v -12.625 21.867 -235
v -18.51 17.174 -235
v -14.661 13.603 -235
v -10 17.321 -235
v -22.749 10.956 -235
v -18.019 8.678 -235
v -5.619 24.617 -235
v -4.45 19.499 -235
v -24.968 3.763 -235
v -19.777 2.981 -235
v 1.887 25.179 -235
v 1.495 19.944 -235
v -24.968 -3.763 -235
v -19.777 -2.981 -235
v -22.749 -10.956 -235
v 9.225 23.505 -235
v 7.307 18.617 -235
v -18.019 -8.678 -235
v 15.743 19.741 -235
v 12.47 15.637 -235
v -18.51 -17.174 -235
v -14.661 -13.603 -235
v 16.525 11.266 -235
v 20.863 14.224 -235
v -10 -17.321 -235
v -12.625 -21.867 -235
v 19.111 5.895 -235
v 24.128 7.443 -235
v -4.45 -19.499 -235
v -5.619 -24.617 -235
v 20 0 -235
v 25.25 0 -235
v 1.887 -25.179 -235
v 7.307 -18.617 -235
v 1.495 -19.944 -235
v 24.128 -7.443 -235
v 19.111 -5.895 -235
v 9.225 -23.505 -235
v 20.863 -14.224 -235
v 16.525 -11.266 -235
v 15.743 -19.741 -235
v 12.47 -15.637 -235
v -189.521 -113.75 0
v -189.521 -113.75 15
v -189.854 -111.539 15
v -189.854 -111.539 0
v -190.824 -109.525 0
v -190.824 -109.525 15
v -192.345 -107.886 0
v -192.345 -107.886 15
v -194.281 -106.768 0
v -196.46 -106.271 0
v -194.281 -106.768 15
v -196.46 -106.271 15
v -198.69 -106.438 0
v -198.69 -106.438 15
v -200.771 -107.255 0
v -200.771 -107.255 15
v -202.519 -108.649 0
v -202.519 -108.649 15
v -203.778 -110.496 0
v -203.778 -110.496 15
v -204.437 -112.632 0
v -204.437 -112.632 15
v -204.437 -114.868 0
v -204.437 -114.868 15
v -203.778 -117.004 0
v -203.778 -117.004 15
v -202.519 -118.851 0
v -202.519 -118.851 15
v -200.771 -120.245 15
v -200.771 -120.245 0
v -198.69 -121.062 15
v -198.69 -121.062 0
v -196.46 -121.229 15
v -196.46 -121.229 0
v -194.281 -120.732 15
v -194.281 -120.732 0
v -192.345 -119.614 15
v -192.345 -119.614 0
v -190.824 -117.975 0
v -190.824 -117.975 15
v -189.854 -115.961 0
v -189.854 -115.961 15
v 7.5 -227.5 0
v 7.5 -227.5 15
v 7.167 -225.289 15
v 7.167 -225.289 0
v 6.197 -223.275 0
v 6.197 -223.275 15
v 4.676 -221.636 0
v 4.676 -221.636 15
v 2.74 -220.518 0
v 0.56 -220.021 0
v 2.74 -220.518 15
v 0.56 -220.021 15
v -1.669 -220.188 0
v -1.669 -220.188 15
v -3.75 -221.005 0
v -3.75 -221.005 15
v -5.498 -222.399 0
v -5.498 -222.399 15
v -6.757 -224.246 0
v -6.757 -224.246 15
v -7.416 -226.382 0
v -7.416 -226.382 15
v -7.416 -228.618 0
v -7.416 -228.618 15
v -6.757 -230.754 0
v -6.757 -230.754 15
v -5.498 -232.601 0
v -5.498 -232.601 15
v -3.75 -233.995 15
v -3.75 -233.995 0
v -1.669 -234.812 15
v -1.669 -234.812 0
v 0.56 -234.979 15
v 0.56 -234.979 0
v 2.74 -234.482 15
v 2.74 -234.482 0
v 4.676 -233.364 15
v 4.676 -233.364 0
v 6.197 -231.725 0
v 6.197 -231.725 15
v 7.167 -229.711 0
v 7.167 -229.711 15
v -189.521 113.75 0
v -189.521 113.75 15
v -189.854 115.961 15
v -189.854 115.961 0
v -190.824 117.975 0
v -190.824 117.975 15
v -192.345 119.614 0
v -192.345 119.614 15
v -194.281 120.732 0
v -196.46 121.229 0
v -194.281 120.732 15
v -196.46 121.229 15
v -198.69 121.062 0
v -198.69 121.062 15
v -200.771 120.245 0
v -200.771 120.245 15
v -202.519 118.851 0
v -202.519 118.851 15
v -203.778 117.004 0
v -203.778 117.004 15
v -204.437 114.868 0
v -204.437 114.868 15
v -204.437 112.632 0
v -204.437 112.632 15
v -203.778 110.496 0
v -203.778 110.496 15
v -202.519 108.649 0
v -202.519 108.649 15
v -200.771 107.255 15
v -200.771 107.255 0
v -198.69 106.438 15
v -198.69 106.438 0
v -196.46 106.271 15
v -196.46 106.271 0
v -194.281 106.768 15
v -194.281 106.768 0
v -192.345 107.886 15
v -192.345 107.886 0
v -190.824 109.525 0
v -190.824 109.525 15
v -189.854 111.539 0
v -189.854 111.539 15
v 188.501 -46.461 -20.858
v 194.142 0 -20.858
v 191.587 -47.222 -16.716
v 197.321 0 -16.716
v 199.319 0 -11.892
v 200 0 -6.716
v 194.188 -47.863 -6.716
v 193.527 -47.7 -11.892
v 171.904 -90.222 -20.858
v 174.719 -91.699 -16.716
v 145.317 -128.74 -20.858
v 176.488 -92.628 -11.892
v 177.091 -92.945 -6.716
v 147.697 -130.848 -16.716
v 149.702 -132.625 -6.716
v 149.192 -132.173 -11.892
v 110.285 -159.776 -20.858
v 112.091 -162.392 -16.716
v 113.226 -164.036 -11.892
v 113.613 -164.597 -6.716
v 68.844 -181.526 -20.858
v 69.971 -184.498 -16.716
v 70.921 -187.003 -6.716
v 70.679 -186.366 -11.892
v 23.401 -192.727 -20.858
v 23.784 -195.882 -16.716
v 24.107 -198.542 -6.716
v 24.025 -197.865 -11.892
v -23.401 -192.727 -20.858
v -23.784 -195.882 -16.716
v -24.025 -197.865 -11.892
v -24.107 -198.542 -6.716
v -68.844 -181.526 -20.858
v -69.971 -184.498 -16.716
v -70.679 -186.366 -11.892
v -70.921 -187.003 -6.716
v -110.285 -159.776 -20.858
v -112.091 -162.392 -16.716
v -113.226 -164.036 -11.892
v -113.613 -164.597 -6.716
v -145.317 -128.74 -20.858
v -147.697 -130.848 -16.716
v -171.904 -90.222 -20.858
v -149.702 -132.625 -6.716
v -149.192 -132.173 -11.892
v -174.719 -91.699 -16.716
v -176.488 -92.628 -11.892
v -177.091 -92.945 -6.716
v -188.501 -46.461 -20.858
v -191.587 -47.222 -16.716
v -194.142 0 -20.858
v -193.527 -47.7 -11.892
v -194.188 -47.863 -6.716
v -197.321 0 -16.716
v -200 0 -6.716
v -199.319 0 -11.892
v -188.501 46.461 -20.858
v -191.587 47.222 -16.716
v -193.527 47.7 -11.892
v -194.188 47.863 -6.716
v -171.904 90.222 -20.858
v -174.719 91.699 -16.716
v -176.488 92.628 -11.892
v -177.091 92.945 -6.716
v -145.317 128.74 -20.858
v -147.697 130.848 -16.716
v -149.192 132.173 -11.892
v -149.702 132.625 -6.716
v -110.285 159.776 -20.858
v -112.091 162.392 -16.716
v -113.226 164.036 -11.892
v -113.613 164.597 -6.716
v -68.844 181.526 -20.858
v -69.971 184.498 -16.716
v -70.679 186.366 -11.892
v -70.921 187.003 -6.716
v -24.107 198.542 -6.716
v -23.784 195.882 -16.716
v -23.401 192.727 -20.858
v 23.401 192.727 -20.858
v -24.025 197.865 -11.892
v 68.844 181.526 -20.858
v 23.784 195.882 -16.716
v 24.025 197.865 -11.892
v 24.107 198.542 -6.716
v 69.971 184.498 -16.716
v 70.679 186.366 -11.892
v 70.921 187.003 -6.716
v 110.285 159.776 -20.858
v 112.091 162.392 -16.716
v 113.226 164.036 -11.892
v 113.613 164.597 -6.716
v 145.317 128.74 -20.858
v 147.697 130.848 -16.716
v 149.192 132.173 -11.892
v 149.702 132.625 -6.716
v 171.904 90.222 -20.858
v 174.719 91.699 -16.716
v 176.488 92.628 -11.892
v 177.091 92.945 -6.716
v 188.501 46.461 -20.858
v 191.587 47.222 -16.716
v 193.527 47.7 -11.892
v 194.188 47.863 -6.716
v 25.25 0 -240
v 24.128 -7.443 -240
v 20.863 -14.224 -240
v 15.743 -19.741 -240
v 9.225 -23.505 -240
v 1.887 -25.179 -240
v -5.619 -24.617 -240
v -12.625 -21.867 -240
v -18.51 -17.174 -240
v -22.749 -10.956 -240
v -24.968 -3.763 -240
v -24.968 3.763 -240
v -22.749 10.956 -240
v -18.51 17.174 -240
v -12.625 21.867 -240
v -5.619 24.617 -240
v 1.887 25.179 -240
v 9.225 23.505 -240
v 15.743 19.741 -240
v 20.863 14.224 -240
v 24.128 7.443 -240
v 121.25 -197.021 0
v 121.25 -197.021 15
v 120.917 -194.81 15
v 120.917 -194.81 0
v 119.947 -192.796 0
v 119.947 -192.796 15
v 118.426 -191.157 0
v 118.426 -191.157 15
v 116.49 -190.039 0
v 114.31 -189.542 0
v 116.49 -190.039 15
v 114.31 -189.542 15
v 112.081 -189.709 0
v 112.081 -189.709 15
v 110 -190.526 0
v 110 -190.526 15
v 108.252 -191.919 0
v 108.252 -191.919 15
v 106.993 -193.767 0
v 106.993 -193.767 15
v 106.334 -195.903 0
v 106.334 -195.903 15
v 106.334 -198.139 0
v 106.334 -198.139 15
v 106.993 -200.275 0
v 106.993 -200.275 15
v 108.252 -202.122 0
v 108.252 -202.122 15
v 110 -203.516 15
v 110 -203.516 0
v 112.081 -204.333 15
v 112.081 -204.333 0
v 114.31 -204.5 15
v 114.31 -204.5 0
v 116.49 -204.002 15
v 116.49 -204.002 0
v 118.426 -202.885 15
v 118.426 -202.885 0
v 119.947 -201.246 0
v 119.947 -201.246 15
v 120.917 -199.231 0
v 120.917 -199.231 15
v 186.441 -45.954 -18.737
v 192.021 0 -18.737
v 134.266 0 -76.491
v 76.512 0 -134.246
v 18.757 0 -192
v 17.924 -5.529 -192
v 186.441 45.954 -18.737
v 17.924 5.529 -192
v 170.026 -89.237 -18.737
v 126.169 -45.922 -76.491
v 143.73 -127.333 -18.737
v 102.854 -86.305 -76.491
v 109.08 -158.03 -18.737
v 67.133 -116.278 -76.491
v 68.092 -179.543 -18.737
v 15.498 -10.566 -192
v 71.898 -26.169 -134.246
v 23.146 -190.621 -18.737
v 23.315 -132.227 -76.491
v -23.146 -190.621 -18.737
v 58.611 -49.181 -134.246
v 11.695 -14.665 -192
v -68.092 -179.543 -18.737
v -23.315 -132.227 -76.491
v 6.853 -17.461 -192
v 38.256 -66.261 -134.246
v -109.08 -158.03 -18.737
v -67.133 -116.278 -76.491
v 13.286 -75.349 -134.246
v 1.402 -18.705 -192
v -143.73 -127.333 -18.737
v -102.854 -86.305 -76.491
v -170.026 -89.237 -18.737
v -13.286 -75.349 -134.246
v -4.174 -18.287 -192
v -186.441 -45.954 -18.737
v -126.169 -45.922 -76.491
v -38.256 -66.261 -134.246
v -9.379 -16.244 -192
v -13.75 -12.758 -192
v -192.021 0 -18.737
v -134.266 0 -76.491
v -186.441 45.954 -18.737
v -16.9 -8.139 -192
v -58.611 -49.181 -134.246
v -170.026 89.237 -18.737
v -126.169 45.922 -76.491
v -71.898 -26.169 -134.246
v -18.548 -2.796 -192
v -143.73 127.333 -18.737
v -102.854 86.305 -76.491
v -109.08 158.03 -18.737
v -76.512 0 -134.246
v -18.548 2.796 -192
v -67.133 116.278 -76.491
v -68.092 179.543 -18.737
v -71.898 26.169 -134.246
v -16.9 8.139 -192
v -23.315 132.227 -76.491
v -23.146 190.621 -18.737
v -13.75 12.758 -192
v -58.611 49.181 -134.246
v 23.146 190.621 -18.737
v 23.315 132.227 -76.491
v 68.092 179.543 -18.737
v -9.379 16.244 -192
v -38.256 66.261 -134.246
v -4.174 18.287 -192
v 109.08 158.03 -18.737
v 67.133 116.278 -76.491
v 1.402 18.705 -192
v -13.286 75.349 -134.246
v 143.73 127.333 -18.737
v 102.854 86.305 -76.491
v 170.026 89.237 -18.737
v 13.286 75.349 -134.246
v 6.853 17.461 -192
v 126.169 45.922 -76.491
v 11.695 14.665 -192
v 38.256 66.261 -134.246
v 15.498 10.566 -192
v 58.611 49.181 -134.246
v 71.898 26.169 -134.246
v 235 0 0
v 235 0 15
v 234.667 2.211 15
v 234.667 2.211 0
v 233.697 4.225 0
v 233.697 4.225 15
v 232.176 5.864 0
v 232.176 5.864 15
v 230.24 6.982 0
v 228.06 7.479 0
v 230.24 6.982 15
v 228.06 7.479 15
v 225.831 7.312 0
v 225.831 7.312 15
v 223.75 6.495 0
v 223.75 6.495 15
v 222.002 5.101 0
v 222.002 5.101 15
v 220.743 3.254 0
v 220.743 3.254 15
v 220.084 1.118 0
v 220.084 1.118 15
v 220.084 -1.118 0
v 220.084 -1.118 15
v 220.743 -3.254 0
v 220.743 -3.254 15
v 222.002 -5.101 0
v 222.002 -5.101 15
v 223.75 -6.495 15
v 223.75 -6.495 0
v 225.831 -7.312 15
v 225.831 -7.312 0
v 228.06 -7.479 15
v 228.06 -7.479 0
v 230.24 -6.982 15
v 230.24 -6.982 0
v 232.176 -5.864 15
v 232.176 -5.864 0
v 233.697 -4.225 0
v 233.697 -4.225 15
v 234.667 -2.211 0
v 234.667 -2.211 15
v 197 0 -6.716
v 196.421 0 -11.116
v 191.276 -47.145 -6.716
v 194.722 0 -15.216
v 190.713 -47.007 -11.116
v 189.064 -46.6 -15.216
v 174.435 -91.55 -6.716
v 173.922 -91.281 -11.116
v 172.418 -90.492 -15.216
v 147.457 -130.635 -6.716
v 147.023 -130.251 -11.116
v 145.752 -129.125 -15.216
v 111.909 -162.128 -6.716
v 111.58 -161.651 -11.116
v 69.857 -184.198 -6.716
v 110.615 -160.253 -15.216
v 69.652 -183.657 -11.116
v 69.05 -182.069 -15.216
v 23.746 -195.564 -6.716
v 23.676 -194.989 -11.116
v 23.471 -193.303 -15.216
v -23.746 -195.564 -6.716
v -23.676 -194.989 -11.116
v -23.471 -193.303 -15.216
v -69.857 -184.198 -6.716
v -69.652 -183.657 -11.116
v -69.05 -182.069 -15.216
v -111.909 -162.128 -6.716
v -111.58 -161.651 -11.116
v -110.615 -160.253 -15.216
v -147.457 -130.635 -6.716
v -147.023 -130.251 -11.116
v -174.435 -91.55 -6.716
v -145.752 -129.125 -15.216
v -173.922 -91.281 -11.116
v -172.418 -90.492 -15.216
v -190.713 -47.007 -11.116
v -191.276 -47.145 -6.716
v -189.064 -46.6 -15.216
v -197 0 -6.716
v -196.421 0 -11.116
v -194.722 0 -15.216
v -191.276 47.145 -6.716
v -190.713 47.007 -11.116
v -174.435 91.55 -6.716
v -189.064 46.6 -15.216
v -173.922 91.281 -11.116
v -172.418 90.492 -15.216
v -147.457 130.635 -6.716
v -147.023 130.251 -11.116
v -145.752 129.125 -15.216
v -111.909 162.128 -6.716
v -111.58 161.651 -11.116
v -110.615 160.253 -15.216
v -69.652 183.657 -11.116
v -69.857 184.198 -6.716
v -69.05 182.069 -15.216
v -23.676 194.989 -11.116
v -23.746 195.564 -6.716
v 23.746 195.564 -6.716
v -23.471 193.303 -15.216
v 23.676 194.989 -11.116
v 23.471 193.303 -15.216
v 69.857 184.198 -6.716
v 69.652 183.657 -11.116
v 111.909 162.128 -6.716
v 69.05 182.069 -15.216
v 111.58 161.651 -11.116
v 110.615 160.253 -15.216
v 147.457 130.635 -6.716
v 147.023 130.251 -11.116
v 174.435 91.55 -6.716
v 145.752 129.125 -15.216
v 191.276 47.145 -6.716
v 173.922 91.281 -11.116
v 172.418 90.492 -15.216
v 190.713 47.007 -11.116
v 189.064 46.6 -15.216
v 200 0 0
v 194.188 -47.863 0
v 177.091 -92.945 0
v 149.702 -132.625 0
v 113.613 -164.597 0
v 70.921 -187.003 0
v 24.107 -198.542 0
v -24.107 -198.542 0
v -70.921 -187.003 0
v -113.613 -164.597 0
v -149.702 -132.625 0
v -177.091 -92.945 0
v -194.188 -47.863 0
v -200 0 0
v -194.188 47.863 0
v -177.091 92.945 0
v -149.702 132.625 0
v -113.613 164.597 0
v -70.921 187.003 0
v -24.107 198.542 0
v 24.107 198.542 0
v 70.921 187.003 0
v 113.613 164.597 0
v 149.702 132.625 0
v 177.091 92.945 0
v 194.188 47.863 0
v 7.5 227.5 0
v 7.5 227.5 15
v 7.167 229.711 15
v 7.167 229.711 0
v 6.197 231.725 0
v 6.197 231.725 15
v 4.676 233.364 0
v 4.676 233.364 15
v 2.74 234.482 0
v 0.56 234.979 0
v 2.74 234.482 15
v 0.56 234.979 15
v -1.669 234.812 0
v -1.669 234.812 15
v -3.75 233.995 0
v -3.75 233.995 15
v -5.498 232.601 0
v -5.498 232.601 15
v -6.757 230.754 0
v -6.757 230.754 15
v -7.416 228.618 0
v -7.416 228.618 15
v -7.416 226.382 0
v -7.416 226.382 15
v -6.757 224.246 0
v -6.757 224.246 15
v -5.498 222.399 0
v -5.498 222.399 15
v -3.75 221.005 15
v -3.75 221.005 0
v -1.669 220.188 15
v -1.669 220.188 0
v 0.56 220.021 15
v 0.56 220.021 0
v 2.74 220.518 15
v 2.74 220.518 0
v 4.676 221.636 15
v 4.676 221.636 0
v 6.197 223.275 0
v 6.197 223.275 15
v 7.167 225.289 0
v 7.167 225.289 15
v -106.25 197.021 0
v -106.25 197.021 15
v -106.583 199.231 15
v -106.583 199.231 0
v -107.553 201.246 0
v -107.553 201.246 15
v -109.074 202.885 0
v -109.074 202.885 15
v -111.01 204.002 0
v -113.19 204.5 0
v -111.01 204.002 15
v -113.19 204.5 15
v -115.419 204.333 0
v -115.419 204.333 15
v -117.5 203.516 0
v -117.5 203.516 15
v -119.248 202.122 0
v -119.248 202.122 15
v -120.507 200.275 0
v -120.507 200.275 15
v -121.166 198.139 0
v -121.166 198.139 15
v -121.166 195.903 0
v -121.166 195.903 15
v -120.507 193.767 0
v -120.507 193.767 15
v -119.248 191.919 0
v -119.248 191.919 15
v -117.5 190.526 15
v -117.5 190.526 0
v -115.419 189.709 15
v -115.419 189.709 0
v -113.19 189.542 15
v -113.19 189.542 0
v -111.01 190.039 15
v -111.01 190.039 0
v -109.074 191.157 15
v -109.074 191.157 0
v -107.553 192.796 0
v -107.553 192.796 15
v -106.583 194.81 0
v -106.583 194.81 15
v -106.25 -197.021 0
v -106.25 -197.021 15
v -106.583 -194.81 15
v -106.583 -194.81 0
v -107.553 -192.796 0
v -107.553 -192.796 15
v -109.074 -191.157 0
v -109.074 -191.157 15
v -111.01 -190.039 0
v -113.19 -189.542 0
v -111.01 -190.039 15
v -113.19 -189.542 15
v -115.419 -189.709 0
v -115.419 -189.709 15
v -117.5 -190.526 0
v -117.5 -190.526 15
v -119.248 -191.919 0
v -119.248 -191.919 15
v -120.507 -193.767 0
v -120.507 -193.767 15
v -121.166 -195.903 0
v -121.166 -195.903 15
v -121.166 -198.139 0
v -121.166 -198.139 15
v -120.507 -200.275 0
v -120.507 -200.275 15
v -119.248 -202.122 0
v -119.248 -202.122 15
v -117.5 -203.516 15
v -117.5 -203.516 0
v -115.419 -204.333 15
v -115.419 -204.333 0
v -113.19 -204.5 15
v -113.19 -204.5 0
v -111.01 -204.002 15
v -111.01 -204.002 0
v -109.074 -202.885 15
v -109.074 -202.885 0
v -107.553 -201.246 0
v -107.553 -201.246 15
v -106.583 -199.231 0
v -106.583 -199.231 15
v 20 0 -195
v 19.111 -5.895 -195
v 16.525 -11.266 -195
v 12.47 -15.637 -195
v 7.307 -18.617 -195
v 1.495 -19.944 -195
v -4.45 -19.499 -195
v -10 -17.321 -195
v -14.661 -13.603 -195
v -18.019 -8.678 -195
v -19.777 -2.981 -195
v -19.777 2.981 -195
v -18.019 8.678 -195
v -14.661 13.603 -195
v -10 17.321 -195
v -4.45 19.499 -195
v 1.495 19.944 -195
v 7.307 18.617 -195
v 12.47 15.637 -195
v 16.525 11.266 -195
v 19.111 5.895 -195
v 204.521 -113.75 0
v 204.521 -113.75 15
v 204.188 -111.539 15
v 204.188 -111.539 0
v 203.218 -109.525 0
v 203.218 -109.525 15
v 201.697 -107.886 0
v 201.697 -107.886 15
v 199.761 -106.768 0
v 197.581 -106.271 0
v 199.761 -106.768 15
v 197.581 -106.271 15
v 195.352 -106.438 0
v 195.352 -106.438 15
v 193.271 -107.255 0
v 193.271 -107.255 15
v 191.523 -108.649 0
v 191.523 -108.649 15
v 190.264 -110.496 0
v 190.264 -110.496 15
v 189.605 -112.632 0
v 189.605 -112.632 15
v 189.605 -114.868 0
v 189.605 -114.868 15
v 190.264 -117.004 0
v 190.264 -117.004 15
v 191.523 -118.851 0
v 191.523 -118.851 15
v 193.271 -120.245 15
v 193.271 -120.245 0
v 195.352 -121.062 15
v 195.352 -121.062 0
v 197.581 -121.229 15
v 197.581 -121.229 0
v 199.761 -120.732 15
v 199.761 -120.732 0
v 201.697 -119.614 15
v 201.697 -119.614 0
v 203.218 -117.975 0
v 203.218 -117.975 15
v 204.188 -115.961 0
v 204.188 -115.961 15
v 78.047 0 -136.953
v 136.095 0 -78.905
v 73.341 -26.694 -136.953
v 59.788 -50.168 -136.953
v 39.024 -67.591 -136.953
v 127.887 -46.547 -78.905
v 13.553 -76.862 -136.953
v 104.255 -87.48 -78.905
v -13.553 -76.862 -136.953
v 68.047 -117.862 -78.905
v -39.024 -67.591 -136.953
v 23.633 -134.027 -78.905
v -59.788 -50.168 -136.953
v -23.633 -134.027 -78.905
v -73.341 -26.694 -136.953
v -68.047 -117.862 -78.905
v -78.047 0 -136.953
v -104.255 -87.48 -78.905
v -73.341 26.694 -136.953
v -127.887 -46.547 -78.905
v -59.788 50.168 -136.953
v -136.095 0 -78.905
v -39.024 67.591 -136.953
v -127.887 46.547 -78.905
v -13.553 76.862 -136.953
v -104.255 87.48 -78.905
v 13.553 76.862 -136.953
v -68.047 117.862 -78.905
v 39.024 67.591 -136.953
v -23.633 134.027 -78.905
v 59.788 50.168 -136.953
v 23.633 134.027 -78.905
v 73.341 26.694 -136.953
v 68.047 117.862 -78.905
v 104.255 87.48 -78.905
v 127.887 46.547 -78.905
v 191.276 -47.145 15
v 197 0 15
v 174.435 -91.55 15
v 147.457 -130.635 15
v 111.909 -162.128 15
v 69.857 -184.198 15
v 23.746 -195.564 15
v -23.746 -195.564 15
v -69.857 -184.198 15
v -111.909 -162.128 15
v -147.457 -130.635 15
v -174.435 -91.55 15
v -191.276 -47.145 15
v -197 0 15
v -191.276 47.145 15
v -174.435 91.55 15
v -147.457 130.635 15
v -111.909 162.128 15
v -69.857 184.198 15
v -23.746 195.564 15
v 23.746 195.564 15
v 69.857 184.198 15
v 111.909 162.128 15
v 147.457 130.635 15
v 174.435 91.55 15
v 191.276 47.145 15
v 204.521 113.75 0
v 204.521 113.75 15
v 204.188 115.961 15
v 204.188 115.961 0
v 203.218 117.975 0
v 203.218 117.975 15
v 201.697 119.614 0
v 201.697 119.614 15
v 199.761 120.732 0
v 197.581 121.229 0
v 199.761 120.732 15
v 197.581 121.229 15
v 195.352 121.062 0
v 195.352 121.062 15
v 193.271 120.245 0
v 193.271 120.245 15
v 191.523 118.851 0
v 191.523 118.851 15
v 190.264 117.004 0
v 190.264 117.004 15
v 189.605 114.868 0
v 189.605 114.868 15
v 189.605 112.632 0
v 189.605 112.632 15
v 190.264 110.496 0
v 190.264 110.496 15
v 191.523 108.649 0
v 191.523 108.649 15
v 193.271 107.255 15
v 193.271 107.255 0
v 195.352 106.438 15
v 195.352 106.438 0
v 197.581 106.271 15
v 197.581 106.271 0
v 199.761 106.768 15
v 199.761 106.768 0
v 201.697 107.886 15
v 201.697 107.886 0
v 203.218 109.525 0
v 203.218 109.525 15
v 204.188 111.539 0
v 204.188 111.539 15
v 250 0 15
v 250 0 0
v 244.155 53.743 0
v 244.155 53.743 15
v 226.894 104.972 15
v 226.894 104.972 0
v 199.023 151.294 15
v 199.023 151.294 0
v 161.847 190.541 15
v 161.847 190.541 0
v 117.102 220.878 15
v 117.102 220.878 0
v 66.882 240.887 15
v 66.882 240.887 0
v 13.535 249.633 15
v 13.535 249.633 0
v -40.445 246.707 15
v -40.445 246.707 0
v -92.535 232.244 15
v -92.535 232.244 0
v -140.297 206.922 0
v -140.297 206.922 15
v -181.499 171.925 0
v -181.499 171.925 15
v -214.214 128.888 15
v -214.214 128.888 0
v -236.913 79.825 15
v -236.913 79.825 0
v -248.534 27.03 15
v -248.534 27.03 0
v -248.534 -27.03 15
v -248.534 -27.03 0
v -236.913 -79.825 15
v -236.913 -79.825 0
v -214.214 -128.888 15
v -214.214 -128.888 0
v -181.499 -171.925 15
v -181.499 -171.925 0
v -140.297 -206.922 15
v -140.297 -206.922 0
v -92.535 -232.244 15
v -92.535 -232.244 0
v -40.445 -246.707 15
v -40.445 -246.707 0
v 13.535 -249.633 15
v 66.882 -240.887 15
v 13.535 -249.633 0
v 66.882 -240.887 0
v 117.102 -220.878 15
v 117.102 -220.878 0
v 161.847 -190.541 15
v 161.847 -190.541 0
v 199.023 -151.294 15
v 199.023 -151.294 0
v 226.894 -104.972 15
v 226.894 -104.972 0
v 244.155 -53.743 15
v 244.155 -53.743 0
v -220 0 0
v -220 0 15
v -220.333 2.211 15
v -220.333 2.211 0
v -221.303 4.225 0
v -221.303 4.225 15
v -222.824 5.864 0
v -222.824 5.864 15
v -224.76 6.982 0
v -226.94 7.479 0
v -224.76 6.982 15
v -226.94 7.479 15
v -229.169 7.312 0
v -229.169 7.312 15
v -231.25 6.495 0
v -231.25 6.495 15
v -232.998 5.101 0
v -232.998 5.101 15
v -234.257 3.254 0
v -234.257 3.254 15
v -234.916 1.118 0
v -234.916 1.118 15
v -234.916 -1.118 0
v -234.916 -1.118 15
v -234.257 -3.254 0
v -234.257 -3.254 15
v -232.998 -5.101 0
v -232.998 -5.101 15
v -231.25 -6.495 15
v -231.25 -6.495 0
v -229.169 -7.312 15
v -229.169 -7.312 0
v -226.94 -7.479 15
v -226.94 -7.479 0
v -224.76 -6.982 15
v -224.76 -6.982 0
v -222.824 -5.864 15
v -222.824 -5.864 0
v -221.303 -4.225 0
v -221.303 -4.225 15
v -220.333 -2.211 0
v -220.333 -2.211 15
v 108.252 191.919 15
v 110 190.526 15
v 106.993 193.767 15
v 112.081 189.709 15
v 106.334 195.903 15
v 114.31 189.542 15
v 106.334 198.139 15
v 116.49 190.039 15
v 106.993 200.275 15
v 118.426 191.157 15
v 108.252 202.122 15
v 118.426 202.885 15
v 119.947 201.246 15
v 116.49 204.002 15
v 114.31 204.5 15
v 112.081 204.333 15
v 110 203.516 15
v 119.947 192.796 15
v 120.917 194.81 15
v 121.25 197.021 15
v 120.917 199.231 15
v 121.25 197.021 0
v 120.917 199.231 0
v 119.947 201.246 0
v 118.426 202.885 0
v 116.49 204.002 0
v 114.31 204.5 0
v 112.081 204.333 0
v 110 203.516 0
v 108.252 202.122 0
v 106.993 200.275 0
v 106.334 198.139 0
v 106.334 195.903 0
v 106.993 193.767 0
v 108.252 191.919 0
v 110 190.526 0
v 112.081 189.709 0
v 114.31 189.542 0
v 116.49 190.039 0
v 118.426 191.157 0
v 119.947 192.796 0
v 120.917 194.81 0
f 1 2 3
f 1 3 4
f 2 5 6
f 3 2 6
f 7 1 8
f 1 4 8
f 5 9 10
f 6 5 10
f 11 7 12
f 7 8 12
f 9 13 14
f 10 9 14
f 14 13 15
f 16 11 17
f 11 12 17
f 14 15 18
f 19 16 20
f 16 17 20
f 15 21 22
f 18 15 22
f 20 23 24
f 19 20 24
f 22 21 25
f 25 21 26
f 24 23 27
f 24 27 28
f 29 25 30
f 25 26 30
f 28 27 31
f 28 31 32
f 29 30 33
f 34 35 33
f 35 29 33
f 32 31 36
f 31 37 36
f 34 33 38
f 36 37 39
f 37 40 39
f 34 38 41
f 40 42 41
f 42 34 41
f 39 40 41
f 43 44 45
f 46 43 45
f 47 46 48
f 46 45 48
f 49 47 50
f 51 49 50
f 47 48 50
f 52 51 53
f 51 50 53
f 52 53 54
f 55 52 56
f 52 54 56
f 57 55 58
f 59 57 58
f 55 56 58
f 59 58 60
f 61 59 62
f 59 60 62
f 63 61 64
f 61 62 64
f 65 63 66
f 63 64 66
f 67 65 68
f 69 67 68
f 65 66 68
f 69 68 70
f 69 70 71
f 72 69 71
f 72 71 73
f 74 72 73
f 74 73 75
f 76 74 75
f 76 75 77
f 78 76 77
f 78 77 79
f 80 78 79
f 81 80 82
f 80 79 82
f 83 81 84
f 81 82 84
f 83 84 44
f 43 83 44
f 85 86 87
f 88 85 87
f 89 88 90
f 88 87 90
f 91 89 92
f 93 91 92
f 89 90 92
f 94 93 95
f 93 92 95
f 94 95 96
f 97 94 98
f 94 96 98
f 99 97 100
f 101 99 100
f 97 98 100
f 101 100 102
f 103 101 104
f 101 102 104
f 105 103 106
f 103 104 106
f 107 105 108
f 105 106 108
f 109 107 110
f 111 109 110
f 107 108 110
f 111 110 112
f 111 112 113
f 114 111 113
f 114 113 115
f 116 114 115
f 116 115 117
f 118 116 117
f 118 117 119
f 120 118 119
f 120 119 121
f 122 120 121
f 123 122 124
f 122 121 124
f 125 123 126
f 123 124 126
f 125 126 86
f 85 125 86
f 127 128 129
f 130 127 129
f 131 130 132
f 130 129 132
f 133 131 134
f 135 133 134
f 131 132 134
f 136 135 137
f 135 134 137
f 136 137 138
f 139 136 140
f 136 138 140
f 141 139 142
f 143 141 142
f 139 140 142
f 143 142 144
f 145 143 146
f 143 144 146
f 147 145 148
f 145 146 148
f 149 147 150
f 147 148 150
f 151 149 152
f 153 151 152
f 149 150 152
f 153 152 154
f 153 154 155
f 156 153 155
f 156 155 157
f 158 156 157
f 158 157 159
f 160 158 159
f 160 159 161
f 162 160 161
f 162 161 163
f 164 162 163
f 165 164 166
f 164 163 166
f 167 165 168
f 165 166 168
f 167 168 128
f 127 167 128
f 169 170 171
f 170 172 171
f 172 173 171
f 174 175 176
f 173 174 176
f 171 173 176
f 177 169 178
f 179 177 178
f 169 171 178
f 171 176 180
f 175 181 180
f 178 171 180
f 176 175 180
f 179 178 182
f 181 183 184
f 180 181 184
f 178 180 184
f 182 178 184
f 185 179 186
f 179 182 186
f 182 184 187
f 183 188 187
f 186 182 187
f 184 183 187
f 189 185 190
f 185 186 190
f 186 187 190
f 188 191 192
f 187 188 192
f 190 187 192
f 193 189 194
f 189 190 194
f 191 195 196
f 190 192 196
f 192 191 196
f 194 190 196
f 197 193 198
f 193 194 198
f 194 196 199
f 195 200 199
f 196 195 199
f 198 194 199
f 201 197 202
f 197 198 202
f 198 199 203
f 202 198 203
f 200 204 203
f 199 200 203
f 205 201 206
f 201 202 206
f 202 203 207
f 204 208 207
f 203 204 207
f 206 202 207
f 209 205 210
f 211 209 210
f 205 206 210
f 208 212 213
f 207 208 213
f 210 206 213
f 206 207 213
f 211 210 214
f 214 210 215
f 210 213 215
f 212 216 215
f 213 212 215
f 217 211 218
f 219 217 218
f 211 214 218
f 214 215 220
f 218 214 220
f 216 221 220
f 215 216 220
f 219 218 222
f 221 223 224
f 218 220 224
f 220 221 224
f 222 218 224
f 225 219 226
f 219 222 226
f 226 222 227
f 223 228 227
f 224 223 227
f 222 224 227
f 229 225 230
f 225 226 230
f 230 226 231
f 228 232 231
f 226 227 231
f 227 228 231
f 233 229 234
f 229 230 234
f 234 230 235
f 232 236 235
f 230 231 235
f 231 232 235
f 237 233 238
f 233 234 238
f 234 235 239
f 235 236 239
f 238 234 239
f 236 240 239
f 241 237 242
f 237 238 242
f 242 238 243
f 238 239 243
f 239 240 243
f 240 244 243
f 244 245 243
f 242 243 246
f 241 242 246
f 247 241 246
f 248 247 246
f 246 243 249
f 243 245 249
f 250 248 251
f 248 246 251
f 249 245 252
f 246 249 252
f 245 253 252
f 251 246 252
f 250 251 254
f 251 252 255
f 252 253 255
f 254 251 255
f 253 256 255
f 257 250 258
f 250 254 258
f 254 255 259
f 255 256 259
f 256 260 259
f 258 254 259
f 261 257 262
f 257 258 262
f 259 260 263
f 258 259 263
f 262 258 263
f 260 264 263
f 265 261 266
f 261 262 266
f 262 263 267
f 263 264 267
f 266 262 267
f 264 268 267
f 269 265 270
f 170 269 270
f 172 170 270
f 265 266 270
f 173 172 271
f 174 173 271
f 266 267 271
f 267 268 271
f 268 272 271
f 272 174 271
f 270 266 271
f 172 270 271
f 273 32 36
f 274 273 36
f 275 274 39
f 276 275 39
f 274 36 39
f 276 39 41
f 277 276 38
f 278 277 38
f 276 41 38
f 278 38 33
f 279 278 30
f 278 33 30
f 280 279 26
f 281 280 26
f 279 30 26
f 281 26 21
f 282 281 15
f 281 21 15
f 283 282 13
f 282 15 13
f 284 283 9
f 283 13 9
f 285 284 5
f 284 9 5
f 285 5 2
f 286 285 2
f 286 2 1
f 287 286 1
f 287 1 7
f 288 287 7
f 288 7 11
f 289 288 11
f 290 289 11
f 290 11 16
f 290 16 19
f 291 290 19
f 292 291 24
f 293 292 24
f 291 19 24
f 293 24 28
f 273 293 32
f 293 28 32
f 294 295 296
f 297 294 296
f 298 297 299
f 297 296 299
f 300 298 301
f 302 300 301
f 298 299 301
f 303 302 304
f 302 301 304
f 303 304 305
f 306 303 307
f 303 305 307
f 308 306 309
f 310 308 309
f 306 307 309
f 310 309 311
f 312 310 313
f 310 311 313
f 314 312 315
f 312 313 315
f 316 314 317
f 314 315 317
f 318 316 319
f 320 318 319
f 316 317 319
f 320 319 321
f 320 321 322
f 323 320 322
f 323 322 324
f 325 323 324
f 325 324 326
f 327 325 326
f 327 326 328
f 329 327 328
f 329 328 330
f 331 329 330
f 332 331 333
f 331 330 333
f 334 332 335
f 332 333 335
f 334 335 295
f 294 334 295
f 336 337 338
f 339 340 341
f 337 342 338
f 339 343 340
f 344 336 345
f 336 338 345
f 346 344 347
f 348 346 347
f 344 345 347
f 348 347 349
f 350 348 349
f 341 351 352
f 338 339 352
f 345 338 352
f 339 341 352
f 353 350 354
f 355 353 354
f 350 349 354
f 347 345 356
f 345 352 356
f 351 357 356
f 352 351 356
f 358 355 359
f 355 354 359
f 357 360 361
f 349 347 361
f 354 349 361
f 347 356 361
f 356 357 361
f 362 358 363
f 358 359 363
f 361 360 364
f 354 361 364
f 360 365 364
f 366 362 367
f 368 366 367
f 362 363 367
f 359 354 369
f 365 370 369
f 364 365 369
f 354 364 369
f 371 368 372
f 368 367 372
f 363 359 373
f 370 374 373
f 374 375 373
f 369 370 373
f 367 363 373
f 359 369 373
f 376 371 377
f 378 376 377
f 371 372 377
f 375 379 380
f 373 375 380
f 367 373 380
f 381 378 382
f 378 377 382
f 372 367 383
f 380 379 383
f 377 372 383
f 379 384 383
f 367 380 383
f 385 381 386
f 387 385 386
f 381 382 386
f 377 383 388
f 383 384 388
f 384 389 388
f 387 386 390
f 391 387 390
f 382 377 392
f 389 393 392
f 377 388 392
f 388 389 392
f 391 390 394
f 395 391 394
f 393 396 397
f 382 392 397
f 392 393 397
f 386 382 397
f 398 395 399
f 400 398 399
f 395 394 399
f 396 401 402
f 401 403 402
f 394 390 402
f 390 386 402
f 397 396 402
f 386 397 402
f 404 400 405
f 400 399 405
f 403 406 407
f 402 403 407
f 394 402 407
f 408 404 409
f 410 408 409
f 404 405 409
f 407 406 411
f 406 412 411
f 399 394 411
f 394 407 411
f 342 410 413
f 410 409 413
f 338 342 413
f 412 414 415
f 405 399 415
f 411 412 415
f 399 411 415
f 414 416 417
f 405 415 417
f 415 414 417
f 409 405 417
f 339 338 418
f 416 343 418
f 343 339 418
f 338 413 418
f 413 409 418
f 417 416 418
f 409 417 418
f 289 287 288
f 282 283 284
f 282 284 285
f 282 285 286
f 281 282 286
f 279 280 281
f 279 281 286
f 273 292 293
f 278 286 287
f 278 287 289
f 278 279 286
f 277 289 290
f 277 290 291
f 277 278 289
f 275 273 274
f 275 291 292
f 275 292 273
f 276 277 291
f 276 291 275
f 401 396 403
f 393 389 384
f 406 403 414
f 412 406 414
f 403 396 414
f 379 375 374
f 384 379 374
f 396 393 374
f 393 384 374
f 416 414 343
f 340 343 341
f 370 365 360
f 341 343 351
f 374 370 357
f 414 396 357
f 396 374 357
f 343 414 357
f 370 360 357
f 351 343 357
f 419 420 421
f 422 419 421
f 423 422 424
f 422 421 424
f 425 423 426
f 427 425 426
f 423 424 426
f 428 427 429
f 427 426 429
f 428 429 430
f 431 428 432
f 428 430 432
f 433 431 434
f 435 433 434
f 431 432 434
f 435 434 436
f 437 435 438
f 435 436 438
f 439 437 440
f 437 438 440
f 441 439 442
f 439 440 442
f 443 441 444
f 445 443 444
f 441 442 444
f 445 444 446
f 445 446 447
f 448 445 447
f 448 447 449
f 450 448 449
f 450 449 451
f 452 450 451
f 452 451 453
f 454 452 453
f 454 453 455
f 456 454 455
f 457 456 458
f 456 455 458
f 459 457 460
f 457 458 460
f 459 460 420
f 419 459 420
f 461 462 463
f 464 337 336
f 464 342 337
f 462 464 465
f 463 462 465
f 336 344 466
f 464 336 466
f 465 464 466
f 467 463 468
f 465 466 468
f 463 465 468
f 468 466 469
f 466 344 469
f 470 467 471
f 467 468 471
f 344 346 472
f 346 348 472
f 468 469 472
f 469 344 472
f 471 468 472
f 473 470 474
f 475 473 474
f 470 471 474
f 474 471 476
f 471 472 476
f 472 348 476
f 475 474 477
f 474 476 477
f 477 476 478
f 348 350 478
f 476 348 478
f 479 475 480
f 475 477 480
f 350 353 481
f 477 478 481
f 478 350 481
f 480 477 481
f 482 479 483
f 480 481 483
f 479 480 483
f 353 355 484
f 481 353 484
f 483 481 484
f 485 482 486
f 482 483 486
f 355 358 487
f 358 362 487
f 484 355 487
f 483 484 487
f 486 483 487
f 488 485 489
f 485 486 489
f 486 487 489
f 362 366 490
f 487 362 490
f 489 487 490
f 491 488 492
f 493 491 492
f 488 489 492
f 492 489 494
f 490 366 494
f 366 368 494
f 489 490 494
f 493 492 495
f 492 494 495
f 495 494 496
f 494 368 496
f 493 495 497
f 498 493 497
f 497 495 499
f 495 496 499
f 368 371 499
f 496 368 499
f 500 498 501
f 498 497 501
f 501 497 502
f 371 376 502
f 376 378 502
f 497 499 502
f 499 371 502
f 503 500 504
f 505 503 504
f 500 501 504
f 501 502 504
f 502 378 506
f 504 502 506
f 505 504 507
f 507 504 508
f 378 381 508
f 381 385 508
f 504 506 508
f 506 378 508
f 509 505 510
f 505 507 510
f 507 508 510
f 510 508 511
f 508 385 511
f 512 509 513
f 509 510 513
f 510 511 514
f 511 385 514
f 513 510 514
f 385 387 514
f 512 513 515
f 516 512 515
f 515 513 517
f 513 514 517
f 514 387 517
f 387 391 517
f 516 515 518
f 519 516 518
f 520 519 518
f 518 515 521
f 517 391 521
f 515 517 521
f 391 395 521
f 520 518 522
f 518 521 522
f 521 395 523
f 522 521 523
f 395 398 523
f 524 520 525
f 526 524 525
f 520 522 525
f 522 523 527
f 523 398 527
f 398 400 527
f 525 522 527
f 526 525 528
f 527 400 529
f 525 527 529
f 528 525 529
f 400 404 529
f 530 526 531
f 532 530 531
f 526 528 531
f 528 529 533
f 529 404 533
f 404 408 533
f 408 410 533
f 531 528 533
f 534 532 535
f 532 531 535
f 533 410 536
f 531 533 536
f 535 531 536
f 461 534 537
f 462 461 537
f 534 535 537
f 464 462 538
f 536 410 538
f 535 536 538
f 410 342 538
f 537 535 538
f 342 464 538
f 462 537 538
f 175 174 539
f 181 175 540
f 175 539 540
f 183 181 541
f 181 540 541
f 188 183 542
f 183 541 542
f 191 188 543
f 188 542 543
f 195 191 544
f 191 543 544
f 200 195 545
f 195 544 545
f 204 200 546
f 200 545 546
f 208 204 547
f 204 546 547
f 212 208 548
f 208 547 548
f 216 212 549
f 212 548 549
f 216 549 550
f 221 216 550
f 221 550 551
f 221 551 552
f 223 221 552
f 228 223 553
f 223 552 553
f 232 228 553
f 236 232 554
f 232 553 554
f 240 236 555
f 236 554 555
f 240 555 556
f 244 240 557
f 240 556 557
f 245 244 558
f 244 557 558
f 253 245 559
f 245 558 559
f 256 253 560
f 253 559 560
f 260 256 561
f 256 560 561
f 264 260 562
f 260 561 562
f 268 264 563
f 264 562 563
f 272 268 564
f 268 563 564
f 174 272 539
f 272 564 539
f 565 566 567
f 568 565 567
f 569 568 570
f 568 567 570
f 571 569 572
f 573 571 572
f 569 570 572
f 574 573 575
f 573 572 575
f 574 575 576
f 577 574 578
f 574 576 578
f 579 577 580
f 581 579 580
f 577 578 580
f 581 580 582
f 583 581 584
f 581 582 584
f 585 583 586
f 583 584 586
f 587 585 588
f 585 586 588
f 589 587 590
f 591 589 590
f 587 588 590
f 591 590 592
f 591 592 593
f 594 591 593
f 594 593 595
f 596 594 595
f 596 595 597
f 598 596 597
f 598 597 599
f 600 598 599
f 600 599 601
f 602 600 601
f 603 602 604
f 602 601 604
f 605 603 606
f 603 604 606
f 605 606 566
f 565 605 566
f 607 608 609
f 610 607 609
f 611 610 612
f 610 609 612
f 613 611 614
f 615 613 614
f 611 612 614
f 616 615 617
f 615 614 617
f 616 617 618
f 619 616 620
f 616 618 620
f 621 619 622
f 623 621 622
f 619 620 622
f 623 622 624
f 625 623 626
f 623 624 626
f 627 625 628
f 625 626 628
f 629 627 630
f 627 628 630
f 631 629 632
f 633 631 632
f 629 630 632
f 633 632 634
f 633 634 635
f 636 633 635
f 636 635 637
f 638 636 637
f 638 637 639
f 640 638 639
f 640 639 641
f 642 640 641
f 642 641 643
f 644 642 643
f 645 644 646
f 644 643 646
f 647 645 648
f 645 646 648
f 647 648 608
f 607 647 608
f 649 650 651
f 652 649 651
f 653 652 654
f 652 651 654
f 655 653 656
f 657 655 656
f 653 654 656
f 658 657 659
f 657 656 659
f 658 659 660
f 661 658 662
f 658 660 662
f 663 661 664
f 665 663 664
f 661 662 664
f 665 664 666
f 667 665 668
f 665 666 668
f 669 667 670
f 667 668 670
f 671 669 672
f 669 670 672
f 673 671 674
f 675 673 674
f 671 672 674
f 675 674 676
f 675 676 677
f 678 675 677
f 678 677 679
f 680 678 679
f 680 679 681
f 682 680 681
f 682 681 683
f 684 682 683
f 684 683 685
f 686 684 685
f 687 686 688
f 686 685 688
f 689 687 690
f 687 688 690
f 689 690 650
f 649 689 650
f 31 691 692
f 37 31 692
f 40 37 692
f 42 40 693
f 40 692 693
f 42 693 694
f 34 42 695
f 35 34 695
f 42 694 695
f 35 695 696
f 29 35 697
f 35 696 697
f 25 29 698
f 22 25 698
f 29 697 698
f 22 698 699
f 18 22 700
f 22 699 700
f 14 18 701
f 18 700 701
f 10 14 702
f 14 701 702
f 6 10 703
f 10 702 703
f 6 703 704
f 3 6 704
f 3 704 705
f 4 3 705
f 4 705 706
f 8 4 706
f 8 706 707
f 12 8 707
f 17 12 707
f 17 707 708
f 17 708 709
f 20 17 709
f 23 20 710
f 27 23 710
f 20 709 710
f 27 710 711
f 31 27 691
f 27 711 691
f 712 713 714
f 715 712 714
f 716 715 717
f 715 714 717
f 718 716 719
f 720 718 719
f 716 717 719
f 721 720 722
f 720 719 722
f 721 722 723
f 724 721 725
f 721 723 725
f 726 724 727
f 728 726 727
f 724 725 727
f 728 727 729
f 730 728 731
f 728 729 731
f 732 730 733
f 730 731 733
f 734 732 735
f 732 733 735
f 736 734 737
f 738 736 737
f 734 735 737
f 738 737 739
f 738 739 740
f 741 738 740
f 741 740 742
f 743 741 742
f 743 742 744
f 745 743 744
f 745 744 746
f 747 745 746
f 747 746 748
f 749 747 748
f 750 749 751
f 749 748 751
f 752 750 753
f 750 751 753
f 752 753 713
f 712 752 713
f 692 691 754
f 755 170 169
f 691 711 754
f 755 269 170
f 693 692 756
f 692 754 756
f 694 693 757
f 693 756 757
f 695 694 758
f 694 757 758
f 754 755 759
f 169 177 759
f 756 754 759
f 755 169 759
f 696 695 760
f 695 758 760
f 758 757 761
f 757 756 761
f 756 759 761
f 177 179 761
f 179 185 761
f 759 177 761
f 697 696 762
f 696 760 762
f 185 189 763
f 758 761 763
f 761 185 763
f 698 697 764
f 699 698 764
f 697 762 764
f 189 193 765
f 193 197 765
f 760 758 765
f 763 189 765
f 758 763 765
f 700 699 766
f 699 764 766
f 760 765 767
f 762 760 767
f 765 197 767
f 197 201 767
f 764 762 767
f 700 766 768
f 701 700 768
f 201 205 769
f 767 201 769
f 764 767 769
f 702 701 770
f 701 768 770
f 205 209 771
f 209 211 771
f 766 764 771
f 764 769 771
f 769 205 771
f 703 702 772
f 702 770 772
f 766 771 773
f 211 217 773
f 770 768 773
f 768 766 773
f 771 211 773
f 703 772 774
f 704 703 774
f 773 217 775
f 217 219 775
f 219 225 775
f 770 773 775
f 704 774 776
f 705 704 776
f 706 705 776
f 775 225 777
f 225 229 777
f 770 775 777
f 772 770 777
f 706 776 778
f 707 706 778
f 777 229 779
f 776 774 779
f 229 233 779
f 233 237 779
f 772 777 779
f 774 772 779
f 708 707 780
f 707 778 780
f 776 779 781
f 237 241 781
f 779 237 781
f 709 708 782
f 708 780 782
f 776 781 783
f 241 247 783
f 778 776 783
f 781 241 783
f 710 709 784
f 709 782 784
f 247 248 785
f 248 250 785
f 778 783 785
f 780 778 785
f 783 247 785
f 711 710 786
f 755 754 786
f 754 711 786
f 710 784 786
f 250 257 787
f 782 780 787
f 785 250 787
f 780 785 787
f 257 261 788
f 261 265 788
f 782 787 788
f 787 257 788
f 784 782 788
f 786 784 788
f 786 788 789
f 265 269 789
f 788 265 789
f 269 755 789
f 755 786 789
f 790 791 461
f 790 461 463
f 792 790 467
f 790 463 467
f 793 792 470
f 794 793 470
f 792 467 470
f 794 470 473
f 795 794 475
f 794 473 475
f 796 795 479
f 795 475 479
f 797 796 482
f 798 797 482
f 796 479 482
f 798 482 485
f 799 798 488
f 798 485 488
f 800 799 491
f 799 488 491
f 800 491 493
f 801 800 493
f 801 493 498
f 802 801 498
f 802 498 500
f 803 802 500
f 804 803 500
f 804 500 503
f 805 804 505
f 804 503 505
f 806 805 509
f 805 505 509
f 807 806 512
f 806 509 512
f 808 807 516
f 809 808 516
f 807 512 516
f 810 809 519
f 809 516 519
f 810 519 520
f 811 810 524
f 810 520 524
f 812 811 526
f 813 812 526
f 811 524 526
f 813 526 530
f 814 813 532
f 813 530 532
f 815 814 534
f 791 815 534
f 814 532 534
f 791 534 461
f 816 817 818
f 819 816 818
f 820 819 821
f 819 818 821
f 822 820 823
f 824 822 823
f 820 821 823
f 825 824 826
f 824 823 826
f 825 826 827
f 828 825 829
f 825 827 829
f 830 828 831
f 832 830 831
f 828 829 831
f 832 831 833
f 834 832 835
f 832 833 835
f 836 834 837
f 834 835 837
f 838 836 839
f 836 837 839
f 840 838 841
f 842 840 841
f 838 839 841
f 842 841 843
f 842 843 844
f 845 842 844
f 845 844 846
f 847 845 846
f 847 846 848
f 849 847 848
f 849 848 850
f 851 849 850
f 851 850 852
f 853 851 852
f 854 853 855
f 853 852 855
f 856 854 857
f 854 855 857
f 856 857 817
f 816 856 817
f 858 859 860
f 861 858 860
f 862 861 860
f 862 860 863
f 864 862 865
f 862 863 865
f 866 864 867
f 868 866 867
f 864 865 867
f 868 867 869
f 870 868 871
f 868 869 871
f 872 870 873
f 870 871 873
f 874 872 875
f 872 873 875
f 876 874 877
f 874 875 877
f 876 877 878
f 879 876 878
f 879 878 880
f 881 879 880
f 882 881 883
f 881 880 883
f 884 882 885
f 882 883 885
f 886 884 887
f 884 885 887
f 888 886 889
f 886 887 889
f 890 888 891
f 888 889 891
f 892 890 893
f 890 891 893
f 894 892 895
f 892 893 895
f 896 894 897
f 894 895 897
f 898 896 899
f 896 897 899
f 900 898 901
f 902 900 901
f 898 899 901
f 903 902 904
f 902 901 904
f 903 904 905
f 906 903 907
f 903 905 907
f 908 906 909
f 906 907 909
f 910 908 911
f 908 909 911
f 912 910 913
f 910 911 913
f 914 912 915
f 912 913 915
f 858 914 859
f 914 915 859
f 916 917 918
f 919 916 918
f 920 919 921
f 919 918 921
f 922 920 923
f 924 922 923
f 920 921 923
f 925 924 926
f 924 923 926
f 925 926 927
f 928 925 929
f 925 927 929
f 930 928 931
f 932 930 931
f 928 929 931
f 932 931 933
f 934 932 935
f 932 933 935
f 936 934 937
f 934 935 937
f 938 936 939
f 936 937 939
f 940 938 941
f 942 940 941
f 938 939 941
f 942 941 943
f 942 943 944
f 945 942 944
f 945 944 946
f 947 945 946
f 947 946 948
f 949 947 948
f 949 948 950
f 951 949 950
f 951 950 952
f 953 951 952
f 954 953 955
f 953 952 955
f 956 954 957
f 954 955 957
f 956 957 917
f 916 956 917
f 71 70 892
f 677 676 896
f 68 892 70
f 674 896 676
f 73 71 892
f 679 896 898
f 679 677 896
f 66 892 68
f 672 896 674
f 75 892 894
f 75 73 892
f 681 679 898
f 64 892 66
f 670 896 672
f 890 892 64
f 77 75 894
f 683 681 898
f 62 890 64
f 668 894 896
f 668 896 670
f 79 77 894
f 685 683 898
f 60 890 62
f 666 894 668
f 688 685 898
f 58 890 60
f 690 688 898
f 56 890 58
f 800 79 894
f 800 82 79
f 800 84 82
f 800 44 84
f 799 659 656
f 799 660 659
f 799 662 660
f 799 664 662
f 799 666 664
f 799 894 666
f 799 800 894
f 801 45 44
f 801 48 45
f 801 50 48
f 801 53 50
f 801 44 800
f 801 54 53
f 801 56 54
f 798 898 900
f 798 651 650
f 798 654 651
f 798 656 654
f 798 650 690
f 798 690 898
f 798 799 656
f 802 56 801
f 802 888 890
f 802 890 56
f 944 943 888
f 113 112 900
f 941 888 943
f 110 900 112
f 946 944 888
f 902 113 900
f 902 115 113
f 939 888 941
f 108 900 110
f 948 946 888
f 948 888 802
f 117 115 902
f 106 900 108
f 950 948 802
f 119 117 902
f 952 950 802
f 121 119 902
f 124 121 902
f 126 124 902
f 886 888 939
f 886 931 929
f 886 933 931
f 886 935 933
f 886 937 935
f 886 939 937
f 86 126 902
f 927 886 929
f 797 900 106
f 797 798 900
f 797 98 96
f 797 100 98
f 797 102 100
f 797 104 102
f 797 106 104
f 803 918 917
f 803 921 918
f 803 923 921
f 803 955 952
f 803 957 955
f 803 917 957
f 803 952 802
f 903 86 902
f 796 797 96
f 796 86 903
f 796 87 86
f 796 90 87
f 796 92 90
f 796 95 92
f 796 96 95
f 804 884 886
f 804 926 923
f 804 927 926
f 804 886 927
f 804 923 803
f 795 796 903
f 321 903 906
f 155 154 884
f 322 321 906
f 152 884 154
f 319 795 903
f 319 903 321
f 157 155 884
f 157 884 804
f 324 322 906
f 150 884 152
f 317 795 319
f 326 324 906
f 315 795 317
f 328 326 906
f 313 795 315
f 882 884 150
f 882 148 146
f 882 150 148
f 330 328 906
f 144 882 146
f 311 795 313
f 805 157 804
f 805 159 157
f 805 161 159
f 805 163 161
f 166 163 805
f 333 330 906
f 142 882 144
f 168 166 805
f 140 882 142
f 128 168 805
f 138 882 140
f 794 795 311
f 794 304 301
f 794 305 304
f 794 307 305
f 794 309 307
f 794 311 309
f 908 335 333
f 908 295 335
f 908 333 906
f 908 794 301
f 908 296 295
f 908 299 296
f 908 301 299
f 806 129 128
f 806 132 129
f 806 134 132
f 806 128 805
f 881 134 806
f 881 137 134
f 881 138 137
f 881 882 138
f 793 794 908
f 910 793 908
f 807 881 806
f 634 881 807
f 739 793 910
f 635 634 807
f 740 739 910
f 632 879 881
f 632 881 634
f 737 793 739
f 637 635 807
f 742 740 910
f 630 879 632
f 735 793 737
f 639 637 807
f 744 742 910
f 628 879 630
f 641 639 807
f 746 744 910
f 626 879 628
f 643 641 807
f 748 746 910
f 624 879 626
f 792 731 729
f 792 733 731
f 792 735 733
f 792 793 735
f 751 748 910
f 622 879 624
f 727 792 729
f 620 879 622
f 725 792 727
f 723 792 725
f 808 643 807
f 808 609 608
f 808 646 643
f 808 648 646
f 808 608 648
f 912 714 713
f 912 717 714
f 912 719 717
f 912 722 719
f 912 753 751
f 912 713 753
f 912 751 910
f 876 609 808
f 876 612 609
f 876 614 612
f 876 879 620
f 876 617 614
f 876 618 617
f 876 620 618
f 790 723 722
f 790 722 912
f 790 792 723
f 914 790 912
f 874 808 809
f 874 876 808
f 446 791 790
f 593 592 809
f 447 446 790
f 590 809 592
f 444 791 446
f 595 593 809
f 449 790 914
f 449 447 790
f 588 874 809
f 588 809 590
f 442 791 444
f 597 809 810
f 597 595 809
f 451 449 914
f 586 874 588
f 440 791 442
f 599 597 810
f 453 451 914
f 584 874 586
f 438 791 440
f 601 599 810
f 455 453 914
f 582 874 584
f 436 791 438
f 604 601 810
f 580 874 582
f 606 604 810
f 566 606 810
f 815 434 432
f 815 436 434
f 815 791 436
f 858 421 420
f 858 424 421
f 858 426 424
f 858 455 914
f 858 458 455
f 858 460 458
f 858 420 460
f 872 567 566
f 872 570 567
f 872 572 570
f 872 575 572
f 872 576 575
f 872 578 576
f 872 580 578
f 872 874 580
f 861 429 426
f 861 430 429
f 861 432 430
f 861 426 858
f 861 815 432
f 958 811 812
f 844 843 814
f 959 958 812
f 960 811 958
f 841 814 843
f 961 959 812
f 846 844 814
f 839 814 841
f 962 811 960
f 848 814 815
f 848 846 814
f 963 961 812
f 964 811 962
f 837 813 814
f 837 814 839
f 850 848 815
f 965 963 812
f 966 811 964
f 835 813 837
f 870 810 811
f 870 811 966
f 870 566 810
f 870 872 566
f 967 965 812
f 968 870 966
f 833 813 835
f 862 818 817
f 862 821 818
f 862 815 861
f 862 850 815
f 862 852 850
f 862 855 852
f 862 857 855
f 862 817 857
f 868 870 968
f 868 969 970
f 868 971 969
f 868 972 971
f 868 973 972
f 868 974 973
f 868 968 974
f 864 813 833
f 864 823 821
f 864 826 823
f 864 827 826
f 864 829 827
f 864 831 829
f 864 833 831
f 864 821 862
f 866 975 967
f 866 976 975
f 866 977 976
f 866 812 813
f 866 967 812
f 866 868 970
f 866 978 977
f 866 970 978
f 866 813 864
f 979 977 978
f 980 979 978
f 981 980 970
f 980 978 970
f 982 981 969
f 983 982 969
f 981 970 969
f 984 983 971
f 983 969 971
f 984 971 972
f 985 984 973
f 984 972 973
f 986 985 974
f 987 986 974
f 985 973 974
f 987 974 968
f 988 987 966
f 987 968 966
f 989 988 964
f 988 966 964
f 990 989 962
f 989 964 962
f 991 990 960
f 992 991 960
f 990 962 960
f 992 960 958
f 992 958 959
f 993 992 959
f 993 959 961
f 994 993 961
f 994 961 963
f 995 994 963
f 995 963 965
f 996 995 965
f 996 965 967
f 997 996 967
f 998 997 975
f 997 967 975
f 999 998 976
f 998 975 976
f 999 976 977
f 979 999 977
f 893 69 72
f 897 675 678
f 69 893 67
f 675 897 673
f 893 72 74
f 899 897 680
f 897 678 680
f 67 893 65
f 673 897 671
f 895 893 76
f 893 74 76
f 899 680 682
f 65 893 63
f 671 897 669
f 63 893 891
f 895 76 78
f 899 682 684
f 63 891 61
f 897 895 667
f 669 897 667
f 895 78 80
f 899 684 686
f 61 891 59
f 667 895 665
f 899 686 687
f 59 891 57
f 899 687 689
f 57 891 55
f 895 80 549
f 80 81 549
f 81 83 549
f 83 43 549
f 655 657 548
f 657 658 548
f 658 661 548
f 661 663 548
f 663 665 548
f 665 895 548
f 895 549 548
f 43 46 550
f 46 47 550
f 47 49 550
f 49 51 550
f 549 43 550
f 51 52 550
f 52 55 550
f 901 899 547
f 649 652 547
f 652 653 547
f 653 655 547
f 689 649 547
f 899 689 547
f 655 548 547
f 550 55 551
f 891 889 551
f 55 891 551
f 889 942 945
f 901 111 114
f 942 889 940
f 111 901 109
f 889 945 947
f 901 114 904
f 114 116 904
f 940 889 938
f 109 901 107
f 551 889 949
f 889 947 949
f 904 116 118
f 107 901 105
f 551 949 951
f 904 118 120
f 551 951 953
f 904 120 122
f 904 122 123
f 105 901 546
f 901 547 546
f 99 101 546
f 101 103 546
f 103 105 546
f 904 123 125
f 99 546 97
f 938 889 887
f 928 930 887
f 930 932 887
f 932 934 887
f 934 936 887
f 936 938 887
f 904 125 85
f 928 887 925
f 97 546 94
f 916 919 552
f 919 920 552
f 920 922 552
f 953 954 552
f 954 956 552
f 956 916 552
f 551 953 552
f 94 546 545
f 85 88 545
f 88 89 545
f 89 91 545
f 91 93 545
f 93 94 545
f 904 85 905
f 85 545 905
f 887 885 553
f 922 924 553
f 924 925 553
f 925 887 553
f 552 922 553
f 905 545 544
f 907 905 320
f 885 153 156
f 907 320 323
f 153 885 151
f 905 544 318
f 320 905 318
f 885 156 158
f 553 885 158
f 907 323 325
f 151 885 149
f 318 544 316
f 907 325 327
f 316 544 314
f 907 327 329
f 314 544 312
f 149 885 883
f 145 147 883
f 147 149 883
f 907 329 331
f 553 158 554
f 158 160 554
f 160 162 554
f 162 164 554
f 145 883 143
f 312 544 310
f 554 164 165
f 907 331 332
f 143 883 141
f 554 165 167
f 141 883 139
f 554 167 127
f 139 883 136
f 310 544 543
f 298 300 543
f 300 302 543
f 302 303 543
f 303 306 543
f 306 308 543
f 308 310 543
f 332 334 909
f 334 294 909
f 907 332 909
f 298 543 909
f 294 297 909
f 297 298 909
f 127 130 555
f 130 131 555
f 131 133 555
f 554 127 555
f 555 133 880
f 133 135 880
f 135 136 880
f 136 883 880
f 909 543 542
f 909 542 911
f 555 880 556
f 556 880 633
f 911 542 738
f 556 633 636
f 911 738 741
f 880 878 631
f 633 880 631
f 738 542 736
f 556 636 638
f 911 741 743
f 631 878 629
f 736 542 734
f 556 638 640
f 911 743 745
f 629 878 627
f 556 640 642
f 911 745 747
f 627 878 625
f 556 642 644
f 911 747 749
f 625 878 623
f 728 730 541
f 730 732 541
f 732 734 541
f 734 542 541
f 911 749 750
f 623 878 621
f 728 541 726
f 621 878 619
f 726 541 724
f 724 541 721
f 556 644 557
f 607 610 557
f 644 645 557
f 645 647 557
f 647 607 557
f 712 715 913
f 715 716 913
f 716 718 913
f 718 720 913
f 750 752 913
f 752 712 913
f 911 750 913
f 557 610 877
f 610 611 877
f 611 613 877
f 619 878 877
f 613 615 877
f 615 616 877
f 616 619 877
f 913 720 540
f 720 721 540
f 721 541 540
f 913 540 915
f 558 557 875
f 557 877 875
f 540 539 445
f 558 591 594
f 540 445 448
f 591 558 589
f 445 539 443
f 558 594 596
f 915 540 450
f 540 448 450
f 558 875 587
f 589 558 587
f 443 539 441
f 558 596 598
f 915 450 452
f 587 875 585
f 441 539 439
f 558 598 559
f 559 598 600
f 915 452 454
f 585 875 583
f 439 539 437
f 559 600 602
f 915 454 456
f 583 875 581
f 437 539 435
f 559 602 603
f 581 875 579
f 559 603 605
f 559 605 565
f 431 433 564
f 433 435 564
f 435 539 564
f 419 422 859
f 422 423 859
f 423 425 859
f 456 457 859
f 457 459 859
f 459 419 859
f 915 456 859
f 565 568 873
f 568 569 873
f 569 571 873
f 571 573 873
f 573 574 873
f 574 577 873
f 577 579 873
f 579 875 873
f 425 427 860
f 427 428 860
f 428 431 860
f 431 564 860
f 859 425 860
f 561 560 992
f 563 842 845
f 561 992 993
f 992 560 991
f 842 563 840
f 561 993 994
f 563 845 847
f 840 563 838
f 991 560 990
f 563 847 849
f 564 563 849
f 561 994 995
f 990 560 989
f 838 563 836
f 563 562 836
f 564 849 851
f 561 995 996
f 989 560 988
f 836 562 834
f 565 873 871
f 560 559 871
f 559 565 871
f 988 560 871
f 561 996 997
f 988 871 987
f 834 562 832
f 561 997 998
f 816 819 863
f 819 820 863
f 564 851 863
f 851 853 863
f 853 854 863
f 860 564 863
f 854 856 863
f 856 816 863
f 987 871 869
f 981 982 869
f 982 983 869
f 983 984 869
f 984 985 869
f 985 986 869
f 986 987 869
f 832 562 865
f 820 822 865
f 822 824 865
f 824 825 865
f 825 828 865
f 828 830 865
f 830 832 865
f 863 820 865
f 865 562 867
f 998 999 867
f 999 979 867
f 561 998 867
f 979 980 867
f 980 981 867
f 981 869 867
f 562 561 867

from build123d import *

# Parameters (mm, degrees)
F0_R     = 250
F0_R_2   = 200
F1_DEPTH = 15
F4_R     = 7.5
F5_DEPTH = 15
F6_R     = 20
F7_DEPTH = 40
F8_R     = 25.25
F9_DEPTH = 5


with BuildPart() as f1:
    # F0 (on Top) → F1 (new body)
    with BuildSketch(Plane.XY):
        Circle(F0_R)
        Circle(F0_R_2, mode=Mode.SUBTRACT)
    extrude(amount=F1_DEPTH)

    # F2 (on Front) → F3 (revolve)
    with BuildSketch(Plane.XZ):
        with BuildLine():
            Line((200, -6.715729), (200, 15))
            Line((200, 15), (197, 15))
            Line((197, 15), (197, -6.715729))
            ThreePointArc((197, -6.715729), (195.705952, -13.221347), (192.020815, -18.736544))
            Line((192.020815, -18.736544), (18.757359, -192))
            Line((18.757359, -192), (0, -192))
            Line((0, -192), (0, -195))
            Line((0, -195), (20, -195))
            Line((20, -195), (194.142136, -20.857864))
            ThreePointArc((194.142136, -20.857864), (198.477591, -14.369397), (200, -6.715729))
        make_face()
    revolve(axis=Axis((0, 0, -193.5), (0, 0, -1)))

    # F4 (on face) → F5 (cut, through all)
    with BuildSketch(Plane.XY.offset(15)):
        with Locations((227.5, 0)):
            Circle(F4_R)
        with Locations((197.020779, 113.75)):
            Circle(F4_R)
        with Locations((113.75, 197.020779)):
            Circle(F4_R)
        with Locations((0, 227.5)):
            Circle(F4_R)
        with Locations((-113.75, 197.020779)):
            Circle(F4_R)
        with Locations((-197.020779, 113.75)):
            Circle(F4_R)
        with Locations((-227.5, 0)):
            Circle(F4_R)
        with Locations((-197.020779, -113.75)):
            Circle(F4_R)
        with Locations((-113.75, -197.020779)):
            Circle(F4_R)
        with Locations((0, -227.5)):
            Circle(F4_R)
        with Locations((113.75, -197.020779)):
            Circle(F4_R)
        with Locations((197.020779, -113.75)):
            Circle(F4_R)
    extrude(amount=-F5_DEPTH, mode=Mode.SUBTRACT)

    # F6 (on face) → F7 (join)
    with BuildSketch(Plane(origin=(0, 0, -195), x_dir=(1, 0, 0), z_dir=(0, 0, -1))):
        Circle(F6_R)
    extrude(amount=F7_DEPTH)

    # F8 (on face) → F9 (join)
    with BuildSketch(Plane(origin=(0, 0, -235), x_dir=(1, 0, 0), z_dir=(0, 0, -1))):
        Circle(F8_R)
    extrude(amount=F9_DEPTH)


solid = f1.part
